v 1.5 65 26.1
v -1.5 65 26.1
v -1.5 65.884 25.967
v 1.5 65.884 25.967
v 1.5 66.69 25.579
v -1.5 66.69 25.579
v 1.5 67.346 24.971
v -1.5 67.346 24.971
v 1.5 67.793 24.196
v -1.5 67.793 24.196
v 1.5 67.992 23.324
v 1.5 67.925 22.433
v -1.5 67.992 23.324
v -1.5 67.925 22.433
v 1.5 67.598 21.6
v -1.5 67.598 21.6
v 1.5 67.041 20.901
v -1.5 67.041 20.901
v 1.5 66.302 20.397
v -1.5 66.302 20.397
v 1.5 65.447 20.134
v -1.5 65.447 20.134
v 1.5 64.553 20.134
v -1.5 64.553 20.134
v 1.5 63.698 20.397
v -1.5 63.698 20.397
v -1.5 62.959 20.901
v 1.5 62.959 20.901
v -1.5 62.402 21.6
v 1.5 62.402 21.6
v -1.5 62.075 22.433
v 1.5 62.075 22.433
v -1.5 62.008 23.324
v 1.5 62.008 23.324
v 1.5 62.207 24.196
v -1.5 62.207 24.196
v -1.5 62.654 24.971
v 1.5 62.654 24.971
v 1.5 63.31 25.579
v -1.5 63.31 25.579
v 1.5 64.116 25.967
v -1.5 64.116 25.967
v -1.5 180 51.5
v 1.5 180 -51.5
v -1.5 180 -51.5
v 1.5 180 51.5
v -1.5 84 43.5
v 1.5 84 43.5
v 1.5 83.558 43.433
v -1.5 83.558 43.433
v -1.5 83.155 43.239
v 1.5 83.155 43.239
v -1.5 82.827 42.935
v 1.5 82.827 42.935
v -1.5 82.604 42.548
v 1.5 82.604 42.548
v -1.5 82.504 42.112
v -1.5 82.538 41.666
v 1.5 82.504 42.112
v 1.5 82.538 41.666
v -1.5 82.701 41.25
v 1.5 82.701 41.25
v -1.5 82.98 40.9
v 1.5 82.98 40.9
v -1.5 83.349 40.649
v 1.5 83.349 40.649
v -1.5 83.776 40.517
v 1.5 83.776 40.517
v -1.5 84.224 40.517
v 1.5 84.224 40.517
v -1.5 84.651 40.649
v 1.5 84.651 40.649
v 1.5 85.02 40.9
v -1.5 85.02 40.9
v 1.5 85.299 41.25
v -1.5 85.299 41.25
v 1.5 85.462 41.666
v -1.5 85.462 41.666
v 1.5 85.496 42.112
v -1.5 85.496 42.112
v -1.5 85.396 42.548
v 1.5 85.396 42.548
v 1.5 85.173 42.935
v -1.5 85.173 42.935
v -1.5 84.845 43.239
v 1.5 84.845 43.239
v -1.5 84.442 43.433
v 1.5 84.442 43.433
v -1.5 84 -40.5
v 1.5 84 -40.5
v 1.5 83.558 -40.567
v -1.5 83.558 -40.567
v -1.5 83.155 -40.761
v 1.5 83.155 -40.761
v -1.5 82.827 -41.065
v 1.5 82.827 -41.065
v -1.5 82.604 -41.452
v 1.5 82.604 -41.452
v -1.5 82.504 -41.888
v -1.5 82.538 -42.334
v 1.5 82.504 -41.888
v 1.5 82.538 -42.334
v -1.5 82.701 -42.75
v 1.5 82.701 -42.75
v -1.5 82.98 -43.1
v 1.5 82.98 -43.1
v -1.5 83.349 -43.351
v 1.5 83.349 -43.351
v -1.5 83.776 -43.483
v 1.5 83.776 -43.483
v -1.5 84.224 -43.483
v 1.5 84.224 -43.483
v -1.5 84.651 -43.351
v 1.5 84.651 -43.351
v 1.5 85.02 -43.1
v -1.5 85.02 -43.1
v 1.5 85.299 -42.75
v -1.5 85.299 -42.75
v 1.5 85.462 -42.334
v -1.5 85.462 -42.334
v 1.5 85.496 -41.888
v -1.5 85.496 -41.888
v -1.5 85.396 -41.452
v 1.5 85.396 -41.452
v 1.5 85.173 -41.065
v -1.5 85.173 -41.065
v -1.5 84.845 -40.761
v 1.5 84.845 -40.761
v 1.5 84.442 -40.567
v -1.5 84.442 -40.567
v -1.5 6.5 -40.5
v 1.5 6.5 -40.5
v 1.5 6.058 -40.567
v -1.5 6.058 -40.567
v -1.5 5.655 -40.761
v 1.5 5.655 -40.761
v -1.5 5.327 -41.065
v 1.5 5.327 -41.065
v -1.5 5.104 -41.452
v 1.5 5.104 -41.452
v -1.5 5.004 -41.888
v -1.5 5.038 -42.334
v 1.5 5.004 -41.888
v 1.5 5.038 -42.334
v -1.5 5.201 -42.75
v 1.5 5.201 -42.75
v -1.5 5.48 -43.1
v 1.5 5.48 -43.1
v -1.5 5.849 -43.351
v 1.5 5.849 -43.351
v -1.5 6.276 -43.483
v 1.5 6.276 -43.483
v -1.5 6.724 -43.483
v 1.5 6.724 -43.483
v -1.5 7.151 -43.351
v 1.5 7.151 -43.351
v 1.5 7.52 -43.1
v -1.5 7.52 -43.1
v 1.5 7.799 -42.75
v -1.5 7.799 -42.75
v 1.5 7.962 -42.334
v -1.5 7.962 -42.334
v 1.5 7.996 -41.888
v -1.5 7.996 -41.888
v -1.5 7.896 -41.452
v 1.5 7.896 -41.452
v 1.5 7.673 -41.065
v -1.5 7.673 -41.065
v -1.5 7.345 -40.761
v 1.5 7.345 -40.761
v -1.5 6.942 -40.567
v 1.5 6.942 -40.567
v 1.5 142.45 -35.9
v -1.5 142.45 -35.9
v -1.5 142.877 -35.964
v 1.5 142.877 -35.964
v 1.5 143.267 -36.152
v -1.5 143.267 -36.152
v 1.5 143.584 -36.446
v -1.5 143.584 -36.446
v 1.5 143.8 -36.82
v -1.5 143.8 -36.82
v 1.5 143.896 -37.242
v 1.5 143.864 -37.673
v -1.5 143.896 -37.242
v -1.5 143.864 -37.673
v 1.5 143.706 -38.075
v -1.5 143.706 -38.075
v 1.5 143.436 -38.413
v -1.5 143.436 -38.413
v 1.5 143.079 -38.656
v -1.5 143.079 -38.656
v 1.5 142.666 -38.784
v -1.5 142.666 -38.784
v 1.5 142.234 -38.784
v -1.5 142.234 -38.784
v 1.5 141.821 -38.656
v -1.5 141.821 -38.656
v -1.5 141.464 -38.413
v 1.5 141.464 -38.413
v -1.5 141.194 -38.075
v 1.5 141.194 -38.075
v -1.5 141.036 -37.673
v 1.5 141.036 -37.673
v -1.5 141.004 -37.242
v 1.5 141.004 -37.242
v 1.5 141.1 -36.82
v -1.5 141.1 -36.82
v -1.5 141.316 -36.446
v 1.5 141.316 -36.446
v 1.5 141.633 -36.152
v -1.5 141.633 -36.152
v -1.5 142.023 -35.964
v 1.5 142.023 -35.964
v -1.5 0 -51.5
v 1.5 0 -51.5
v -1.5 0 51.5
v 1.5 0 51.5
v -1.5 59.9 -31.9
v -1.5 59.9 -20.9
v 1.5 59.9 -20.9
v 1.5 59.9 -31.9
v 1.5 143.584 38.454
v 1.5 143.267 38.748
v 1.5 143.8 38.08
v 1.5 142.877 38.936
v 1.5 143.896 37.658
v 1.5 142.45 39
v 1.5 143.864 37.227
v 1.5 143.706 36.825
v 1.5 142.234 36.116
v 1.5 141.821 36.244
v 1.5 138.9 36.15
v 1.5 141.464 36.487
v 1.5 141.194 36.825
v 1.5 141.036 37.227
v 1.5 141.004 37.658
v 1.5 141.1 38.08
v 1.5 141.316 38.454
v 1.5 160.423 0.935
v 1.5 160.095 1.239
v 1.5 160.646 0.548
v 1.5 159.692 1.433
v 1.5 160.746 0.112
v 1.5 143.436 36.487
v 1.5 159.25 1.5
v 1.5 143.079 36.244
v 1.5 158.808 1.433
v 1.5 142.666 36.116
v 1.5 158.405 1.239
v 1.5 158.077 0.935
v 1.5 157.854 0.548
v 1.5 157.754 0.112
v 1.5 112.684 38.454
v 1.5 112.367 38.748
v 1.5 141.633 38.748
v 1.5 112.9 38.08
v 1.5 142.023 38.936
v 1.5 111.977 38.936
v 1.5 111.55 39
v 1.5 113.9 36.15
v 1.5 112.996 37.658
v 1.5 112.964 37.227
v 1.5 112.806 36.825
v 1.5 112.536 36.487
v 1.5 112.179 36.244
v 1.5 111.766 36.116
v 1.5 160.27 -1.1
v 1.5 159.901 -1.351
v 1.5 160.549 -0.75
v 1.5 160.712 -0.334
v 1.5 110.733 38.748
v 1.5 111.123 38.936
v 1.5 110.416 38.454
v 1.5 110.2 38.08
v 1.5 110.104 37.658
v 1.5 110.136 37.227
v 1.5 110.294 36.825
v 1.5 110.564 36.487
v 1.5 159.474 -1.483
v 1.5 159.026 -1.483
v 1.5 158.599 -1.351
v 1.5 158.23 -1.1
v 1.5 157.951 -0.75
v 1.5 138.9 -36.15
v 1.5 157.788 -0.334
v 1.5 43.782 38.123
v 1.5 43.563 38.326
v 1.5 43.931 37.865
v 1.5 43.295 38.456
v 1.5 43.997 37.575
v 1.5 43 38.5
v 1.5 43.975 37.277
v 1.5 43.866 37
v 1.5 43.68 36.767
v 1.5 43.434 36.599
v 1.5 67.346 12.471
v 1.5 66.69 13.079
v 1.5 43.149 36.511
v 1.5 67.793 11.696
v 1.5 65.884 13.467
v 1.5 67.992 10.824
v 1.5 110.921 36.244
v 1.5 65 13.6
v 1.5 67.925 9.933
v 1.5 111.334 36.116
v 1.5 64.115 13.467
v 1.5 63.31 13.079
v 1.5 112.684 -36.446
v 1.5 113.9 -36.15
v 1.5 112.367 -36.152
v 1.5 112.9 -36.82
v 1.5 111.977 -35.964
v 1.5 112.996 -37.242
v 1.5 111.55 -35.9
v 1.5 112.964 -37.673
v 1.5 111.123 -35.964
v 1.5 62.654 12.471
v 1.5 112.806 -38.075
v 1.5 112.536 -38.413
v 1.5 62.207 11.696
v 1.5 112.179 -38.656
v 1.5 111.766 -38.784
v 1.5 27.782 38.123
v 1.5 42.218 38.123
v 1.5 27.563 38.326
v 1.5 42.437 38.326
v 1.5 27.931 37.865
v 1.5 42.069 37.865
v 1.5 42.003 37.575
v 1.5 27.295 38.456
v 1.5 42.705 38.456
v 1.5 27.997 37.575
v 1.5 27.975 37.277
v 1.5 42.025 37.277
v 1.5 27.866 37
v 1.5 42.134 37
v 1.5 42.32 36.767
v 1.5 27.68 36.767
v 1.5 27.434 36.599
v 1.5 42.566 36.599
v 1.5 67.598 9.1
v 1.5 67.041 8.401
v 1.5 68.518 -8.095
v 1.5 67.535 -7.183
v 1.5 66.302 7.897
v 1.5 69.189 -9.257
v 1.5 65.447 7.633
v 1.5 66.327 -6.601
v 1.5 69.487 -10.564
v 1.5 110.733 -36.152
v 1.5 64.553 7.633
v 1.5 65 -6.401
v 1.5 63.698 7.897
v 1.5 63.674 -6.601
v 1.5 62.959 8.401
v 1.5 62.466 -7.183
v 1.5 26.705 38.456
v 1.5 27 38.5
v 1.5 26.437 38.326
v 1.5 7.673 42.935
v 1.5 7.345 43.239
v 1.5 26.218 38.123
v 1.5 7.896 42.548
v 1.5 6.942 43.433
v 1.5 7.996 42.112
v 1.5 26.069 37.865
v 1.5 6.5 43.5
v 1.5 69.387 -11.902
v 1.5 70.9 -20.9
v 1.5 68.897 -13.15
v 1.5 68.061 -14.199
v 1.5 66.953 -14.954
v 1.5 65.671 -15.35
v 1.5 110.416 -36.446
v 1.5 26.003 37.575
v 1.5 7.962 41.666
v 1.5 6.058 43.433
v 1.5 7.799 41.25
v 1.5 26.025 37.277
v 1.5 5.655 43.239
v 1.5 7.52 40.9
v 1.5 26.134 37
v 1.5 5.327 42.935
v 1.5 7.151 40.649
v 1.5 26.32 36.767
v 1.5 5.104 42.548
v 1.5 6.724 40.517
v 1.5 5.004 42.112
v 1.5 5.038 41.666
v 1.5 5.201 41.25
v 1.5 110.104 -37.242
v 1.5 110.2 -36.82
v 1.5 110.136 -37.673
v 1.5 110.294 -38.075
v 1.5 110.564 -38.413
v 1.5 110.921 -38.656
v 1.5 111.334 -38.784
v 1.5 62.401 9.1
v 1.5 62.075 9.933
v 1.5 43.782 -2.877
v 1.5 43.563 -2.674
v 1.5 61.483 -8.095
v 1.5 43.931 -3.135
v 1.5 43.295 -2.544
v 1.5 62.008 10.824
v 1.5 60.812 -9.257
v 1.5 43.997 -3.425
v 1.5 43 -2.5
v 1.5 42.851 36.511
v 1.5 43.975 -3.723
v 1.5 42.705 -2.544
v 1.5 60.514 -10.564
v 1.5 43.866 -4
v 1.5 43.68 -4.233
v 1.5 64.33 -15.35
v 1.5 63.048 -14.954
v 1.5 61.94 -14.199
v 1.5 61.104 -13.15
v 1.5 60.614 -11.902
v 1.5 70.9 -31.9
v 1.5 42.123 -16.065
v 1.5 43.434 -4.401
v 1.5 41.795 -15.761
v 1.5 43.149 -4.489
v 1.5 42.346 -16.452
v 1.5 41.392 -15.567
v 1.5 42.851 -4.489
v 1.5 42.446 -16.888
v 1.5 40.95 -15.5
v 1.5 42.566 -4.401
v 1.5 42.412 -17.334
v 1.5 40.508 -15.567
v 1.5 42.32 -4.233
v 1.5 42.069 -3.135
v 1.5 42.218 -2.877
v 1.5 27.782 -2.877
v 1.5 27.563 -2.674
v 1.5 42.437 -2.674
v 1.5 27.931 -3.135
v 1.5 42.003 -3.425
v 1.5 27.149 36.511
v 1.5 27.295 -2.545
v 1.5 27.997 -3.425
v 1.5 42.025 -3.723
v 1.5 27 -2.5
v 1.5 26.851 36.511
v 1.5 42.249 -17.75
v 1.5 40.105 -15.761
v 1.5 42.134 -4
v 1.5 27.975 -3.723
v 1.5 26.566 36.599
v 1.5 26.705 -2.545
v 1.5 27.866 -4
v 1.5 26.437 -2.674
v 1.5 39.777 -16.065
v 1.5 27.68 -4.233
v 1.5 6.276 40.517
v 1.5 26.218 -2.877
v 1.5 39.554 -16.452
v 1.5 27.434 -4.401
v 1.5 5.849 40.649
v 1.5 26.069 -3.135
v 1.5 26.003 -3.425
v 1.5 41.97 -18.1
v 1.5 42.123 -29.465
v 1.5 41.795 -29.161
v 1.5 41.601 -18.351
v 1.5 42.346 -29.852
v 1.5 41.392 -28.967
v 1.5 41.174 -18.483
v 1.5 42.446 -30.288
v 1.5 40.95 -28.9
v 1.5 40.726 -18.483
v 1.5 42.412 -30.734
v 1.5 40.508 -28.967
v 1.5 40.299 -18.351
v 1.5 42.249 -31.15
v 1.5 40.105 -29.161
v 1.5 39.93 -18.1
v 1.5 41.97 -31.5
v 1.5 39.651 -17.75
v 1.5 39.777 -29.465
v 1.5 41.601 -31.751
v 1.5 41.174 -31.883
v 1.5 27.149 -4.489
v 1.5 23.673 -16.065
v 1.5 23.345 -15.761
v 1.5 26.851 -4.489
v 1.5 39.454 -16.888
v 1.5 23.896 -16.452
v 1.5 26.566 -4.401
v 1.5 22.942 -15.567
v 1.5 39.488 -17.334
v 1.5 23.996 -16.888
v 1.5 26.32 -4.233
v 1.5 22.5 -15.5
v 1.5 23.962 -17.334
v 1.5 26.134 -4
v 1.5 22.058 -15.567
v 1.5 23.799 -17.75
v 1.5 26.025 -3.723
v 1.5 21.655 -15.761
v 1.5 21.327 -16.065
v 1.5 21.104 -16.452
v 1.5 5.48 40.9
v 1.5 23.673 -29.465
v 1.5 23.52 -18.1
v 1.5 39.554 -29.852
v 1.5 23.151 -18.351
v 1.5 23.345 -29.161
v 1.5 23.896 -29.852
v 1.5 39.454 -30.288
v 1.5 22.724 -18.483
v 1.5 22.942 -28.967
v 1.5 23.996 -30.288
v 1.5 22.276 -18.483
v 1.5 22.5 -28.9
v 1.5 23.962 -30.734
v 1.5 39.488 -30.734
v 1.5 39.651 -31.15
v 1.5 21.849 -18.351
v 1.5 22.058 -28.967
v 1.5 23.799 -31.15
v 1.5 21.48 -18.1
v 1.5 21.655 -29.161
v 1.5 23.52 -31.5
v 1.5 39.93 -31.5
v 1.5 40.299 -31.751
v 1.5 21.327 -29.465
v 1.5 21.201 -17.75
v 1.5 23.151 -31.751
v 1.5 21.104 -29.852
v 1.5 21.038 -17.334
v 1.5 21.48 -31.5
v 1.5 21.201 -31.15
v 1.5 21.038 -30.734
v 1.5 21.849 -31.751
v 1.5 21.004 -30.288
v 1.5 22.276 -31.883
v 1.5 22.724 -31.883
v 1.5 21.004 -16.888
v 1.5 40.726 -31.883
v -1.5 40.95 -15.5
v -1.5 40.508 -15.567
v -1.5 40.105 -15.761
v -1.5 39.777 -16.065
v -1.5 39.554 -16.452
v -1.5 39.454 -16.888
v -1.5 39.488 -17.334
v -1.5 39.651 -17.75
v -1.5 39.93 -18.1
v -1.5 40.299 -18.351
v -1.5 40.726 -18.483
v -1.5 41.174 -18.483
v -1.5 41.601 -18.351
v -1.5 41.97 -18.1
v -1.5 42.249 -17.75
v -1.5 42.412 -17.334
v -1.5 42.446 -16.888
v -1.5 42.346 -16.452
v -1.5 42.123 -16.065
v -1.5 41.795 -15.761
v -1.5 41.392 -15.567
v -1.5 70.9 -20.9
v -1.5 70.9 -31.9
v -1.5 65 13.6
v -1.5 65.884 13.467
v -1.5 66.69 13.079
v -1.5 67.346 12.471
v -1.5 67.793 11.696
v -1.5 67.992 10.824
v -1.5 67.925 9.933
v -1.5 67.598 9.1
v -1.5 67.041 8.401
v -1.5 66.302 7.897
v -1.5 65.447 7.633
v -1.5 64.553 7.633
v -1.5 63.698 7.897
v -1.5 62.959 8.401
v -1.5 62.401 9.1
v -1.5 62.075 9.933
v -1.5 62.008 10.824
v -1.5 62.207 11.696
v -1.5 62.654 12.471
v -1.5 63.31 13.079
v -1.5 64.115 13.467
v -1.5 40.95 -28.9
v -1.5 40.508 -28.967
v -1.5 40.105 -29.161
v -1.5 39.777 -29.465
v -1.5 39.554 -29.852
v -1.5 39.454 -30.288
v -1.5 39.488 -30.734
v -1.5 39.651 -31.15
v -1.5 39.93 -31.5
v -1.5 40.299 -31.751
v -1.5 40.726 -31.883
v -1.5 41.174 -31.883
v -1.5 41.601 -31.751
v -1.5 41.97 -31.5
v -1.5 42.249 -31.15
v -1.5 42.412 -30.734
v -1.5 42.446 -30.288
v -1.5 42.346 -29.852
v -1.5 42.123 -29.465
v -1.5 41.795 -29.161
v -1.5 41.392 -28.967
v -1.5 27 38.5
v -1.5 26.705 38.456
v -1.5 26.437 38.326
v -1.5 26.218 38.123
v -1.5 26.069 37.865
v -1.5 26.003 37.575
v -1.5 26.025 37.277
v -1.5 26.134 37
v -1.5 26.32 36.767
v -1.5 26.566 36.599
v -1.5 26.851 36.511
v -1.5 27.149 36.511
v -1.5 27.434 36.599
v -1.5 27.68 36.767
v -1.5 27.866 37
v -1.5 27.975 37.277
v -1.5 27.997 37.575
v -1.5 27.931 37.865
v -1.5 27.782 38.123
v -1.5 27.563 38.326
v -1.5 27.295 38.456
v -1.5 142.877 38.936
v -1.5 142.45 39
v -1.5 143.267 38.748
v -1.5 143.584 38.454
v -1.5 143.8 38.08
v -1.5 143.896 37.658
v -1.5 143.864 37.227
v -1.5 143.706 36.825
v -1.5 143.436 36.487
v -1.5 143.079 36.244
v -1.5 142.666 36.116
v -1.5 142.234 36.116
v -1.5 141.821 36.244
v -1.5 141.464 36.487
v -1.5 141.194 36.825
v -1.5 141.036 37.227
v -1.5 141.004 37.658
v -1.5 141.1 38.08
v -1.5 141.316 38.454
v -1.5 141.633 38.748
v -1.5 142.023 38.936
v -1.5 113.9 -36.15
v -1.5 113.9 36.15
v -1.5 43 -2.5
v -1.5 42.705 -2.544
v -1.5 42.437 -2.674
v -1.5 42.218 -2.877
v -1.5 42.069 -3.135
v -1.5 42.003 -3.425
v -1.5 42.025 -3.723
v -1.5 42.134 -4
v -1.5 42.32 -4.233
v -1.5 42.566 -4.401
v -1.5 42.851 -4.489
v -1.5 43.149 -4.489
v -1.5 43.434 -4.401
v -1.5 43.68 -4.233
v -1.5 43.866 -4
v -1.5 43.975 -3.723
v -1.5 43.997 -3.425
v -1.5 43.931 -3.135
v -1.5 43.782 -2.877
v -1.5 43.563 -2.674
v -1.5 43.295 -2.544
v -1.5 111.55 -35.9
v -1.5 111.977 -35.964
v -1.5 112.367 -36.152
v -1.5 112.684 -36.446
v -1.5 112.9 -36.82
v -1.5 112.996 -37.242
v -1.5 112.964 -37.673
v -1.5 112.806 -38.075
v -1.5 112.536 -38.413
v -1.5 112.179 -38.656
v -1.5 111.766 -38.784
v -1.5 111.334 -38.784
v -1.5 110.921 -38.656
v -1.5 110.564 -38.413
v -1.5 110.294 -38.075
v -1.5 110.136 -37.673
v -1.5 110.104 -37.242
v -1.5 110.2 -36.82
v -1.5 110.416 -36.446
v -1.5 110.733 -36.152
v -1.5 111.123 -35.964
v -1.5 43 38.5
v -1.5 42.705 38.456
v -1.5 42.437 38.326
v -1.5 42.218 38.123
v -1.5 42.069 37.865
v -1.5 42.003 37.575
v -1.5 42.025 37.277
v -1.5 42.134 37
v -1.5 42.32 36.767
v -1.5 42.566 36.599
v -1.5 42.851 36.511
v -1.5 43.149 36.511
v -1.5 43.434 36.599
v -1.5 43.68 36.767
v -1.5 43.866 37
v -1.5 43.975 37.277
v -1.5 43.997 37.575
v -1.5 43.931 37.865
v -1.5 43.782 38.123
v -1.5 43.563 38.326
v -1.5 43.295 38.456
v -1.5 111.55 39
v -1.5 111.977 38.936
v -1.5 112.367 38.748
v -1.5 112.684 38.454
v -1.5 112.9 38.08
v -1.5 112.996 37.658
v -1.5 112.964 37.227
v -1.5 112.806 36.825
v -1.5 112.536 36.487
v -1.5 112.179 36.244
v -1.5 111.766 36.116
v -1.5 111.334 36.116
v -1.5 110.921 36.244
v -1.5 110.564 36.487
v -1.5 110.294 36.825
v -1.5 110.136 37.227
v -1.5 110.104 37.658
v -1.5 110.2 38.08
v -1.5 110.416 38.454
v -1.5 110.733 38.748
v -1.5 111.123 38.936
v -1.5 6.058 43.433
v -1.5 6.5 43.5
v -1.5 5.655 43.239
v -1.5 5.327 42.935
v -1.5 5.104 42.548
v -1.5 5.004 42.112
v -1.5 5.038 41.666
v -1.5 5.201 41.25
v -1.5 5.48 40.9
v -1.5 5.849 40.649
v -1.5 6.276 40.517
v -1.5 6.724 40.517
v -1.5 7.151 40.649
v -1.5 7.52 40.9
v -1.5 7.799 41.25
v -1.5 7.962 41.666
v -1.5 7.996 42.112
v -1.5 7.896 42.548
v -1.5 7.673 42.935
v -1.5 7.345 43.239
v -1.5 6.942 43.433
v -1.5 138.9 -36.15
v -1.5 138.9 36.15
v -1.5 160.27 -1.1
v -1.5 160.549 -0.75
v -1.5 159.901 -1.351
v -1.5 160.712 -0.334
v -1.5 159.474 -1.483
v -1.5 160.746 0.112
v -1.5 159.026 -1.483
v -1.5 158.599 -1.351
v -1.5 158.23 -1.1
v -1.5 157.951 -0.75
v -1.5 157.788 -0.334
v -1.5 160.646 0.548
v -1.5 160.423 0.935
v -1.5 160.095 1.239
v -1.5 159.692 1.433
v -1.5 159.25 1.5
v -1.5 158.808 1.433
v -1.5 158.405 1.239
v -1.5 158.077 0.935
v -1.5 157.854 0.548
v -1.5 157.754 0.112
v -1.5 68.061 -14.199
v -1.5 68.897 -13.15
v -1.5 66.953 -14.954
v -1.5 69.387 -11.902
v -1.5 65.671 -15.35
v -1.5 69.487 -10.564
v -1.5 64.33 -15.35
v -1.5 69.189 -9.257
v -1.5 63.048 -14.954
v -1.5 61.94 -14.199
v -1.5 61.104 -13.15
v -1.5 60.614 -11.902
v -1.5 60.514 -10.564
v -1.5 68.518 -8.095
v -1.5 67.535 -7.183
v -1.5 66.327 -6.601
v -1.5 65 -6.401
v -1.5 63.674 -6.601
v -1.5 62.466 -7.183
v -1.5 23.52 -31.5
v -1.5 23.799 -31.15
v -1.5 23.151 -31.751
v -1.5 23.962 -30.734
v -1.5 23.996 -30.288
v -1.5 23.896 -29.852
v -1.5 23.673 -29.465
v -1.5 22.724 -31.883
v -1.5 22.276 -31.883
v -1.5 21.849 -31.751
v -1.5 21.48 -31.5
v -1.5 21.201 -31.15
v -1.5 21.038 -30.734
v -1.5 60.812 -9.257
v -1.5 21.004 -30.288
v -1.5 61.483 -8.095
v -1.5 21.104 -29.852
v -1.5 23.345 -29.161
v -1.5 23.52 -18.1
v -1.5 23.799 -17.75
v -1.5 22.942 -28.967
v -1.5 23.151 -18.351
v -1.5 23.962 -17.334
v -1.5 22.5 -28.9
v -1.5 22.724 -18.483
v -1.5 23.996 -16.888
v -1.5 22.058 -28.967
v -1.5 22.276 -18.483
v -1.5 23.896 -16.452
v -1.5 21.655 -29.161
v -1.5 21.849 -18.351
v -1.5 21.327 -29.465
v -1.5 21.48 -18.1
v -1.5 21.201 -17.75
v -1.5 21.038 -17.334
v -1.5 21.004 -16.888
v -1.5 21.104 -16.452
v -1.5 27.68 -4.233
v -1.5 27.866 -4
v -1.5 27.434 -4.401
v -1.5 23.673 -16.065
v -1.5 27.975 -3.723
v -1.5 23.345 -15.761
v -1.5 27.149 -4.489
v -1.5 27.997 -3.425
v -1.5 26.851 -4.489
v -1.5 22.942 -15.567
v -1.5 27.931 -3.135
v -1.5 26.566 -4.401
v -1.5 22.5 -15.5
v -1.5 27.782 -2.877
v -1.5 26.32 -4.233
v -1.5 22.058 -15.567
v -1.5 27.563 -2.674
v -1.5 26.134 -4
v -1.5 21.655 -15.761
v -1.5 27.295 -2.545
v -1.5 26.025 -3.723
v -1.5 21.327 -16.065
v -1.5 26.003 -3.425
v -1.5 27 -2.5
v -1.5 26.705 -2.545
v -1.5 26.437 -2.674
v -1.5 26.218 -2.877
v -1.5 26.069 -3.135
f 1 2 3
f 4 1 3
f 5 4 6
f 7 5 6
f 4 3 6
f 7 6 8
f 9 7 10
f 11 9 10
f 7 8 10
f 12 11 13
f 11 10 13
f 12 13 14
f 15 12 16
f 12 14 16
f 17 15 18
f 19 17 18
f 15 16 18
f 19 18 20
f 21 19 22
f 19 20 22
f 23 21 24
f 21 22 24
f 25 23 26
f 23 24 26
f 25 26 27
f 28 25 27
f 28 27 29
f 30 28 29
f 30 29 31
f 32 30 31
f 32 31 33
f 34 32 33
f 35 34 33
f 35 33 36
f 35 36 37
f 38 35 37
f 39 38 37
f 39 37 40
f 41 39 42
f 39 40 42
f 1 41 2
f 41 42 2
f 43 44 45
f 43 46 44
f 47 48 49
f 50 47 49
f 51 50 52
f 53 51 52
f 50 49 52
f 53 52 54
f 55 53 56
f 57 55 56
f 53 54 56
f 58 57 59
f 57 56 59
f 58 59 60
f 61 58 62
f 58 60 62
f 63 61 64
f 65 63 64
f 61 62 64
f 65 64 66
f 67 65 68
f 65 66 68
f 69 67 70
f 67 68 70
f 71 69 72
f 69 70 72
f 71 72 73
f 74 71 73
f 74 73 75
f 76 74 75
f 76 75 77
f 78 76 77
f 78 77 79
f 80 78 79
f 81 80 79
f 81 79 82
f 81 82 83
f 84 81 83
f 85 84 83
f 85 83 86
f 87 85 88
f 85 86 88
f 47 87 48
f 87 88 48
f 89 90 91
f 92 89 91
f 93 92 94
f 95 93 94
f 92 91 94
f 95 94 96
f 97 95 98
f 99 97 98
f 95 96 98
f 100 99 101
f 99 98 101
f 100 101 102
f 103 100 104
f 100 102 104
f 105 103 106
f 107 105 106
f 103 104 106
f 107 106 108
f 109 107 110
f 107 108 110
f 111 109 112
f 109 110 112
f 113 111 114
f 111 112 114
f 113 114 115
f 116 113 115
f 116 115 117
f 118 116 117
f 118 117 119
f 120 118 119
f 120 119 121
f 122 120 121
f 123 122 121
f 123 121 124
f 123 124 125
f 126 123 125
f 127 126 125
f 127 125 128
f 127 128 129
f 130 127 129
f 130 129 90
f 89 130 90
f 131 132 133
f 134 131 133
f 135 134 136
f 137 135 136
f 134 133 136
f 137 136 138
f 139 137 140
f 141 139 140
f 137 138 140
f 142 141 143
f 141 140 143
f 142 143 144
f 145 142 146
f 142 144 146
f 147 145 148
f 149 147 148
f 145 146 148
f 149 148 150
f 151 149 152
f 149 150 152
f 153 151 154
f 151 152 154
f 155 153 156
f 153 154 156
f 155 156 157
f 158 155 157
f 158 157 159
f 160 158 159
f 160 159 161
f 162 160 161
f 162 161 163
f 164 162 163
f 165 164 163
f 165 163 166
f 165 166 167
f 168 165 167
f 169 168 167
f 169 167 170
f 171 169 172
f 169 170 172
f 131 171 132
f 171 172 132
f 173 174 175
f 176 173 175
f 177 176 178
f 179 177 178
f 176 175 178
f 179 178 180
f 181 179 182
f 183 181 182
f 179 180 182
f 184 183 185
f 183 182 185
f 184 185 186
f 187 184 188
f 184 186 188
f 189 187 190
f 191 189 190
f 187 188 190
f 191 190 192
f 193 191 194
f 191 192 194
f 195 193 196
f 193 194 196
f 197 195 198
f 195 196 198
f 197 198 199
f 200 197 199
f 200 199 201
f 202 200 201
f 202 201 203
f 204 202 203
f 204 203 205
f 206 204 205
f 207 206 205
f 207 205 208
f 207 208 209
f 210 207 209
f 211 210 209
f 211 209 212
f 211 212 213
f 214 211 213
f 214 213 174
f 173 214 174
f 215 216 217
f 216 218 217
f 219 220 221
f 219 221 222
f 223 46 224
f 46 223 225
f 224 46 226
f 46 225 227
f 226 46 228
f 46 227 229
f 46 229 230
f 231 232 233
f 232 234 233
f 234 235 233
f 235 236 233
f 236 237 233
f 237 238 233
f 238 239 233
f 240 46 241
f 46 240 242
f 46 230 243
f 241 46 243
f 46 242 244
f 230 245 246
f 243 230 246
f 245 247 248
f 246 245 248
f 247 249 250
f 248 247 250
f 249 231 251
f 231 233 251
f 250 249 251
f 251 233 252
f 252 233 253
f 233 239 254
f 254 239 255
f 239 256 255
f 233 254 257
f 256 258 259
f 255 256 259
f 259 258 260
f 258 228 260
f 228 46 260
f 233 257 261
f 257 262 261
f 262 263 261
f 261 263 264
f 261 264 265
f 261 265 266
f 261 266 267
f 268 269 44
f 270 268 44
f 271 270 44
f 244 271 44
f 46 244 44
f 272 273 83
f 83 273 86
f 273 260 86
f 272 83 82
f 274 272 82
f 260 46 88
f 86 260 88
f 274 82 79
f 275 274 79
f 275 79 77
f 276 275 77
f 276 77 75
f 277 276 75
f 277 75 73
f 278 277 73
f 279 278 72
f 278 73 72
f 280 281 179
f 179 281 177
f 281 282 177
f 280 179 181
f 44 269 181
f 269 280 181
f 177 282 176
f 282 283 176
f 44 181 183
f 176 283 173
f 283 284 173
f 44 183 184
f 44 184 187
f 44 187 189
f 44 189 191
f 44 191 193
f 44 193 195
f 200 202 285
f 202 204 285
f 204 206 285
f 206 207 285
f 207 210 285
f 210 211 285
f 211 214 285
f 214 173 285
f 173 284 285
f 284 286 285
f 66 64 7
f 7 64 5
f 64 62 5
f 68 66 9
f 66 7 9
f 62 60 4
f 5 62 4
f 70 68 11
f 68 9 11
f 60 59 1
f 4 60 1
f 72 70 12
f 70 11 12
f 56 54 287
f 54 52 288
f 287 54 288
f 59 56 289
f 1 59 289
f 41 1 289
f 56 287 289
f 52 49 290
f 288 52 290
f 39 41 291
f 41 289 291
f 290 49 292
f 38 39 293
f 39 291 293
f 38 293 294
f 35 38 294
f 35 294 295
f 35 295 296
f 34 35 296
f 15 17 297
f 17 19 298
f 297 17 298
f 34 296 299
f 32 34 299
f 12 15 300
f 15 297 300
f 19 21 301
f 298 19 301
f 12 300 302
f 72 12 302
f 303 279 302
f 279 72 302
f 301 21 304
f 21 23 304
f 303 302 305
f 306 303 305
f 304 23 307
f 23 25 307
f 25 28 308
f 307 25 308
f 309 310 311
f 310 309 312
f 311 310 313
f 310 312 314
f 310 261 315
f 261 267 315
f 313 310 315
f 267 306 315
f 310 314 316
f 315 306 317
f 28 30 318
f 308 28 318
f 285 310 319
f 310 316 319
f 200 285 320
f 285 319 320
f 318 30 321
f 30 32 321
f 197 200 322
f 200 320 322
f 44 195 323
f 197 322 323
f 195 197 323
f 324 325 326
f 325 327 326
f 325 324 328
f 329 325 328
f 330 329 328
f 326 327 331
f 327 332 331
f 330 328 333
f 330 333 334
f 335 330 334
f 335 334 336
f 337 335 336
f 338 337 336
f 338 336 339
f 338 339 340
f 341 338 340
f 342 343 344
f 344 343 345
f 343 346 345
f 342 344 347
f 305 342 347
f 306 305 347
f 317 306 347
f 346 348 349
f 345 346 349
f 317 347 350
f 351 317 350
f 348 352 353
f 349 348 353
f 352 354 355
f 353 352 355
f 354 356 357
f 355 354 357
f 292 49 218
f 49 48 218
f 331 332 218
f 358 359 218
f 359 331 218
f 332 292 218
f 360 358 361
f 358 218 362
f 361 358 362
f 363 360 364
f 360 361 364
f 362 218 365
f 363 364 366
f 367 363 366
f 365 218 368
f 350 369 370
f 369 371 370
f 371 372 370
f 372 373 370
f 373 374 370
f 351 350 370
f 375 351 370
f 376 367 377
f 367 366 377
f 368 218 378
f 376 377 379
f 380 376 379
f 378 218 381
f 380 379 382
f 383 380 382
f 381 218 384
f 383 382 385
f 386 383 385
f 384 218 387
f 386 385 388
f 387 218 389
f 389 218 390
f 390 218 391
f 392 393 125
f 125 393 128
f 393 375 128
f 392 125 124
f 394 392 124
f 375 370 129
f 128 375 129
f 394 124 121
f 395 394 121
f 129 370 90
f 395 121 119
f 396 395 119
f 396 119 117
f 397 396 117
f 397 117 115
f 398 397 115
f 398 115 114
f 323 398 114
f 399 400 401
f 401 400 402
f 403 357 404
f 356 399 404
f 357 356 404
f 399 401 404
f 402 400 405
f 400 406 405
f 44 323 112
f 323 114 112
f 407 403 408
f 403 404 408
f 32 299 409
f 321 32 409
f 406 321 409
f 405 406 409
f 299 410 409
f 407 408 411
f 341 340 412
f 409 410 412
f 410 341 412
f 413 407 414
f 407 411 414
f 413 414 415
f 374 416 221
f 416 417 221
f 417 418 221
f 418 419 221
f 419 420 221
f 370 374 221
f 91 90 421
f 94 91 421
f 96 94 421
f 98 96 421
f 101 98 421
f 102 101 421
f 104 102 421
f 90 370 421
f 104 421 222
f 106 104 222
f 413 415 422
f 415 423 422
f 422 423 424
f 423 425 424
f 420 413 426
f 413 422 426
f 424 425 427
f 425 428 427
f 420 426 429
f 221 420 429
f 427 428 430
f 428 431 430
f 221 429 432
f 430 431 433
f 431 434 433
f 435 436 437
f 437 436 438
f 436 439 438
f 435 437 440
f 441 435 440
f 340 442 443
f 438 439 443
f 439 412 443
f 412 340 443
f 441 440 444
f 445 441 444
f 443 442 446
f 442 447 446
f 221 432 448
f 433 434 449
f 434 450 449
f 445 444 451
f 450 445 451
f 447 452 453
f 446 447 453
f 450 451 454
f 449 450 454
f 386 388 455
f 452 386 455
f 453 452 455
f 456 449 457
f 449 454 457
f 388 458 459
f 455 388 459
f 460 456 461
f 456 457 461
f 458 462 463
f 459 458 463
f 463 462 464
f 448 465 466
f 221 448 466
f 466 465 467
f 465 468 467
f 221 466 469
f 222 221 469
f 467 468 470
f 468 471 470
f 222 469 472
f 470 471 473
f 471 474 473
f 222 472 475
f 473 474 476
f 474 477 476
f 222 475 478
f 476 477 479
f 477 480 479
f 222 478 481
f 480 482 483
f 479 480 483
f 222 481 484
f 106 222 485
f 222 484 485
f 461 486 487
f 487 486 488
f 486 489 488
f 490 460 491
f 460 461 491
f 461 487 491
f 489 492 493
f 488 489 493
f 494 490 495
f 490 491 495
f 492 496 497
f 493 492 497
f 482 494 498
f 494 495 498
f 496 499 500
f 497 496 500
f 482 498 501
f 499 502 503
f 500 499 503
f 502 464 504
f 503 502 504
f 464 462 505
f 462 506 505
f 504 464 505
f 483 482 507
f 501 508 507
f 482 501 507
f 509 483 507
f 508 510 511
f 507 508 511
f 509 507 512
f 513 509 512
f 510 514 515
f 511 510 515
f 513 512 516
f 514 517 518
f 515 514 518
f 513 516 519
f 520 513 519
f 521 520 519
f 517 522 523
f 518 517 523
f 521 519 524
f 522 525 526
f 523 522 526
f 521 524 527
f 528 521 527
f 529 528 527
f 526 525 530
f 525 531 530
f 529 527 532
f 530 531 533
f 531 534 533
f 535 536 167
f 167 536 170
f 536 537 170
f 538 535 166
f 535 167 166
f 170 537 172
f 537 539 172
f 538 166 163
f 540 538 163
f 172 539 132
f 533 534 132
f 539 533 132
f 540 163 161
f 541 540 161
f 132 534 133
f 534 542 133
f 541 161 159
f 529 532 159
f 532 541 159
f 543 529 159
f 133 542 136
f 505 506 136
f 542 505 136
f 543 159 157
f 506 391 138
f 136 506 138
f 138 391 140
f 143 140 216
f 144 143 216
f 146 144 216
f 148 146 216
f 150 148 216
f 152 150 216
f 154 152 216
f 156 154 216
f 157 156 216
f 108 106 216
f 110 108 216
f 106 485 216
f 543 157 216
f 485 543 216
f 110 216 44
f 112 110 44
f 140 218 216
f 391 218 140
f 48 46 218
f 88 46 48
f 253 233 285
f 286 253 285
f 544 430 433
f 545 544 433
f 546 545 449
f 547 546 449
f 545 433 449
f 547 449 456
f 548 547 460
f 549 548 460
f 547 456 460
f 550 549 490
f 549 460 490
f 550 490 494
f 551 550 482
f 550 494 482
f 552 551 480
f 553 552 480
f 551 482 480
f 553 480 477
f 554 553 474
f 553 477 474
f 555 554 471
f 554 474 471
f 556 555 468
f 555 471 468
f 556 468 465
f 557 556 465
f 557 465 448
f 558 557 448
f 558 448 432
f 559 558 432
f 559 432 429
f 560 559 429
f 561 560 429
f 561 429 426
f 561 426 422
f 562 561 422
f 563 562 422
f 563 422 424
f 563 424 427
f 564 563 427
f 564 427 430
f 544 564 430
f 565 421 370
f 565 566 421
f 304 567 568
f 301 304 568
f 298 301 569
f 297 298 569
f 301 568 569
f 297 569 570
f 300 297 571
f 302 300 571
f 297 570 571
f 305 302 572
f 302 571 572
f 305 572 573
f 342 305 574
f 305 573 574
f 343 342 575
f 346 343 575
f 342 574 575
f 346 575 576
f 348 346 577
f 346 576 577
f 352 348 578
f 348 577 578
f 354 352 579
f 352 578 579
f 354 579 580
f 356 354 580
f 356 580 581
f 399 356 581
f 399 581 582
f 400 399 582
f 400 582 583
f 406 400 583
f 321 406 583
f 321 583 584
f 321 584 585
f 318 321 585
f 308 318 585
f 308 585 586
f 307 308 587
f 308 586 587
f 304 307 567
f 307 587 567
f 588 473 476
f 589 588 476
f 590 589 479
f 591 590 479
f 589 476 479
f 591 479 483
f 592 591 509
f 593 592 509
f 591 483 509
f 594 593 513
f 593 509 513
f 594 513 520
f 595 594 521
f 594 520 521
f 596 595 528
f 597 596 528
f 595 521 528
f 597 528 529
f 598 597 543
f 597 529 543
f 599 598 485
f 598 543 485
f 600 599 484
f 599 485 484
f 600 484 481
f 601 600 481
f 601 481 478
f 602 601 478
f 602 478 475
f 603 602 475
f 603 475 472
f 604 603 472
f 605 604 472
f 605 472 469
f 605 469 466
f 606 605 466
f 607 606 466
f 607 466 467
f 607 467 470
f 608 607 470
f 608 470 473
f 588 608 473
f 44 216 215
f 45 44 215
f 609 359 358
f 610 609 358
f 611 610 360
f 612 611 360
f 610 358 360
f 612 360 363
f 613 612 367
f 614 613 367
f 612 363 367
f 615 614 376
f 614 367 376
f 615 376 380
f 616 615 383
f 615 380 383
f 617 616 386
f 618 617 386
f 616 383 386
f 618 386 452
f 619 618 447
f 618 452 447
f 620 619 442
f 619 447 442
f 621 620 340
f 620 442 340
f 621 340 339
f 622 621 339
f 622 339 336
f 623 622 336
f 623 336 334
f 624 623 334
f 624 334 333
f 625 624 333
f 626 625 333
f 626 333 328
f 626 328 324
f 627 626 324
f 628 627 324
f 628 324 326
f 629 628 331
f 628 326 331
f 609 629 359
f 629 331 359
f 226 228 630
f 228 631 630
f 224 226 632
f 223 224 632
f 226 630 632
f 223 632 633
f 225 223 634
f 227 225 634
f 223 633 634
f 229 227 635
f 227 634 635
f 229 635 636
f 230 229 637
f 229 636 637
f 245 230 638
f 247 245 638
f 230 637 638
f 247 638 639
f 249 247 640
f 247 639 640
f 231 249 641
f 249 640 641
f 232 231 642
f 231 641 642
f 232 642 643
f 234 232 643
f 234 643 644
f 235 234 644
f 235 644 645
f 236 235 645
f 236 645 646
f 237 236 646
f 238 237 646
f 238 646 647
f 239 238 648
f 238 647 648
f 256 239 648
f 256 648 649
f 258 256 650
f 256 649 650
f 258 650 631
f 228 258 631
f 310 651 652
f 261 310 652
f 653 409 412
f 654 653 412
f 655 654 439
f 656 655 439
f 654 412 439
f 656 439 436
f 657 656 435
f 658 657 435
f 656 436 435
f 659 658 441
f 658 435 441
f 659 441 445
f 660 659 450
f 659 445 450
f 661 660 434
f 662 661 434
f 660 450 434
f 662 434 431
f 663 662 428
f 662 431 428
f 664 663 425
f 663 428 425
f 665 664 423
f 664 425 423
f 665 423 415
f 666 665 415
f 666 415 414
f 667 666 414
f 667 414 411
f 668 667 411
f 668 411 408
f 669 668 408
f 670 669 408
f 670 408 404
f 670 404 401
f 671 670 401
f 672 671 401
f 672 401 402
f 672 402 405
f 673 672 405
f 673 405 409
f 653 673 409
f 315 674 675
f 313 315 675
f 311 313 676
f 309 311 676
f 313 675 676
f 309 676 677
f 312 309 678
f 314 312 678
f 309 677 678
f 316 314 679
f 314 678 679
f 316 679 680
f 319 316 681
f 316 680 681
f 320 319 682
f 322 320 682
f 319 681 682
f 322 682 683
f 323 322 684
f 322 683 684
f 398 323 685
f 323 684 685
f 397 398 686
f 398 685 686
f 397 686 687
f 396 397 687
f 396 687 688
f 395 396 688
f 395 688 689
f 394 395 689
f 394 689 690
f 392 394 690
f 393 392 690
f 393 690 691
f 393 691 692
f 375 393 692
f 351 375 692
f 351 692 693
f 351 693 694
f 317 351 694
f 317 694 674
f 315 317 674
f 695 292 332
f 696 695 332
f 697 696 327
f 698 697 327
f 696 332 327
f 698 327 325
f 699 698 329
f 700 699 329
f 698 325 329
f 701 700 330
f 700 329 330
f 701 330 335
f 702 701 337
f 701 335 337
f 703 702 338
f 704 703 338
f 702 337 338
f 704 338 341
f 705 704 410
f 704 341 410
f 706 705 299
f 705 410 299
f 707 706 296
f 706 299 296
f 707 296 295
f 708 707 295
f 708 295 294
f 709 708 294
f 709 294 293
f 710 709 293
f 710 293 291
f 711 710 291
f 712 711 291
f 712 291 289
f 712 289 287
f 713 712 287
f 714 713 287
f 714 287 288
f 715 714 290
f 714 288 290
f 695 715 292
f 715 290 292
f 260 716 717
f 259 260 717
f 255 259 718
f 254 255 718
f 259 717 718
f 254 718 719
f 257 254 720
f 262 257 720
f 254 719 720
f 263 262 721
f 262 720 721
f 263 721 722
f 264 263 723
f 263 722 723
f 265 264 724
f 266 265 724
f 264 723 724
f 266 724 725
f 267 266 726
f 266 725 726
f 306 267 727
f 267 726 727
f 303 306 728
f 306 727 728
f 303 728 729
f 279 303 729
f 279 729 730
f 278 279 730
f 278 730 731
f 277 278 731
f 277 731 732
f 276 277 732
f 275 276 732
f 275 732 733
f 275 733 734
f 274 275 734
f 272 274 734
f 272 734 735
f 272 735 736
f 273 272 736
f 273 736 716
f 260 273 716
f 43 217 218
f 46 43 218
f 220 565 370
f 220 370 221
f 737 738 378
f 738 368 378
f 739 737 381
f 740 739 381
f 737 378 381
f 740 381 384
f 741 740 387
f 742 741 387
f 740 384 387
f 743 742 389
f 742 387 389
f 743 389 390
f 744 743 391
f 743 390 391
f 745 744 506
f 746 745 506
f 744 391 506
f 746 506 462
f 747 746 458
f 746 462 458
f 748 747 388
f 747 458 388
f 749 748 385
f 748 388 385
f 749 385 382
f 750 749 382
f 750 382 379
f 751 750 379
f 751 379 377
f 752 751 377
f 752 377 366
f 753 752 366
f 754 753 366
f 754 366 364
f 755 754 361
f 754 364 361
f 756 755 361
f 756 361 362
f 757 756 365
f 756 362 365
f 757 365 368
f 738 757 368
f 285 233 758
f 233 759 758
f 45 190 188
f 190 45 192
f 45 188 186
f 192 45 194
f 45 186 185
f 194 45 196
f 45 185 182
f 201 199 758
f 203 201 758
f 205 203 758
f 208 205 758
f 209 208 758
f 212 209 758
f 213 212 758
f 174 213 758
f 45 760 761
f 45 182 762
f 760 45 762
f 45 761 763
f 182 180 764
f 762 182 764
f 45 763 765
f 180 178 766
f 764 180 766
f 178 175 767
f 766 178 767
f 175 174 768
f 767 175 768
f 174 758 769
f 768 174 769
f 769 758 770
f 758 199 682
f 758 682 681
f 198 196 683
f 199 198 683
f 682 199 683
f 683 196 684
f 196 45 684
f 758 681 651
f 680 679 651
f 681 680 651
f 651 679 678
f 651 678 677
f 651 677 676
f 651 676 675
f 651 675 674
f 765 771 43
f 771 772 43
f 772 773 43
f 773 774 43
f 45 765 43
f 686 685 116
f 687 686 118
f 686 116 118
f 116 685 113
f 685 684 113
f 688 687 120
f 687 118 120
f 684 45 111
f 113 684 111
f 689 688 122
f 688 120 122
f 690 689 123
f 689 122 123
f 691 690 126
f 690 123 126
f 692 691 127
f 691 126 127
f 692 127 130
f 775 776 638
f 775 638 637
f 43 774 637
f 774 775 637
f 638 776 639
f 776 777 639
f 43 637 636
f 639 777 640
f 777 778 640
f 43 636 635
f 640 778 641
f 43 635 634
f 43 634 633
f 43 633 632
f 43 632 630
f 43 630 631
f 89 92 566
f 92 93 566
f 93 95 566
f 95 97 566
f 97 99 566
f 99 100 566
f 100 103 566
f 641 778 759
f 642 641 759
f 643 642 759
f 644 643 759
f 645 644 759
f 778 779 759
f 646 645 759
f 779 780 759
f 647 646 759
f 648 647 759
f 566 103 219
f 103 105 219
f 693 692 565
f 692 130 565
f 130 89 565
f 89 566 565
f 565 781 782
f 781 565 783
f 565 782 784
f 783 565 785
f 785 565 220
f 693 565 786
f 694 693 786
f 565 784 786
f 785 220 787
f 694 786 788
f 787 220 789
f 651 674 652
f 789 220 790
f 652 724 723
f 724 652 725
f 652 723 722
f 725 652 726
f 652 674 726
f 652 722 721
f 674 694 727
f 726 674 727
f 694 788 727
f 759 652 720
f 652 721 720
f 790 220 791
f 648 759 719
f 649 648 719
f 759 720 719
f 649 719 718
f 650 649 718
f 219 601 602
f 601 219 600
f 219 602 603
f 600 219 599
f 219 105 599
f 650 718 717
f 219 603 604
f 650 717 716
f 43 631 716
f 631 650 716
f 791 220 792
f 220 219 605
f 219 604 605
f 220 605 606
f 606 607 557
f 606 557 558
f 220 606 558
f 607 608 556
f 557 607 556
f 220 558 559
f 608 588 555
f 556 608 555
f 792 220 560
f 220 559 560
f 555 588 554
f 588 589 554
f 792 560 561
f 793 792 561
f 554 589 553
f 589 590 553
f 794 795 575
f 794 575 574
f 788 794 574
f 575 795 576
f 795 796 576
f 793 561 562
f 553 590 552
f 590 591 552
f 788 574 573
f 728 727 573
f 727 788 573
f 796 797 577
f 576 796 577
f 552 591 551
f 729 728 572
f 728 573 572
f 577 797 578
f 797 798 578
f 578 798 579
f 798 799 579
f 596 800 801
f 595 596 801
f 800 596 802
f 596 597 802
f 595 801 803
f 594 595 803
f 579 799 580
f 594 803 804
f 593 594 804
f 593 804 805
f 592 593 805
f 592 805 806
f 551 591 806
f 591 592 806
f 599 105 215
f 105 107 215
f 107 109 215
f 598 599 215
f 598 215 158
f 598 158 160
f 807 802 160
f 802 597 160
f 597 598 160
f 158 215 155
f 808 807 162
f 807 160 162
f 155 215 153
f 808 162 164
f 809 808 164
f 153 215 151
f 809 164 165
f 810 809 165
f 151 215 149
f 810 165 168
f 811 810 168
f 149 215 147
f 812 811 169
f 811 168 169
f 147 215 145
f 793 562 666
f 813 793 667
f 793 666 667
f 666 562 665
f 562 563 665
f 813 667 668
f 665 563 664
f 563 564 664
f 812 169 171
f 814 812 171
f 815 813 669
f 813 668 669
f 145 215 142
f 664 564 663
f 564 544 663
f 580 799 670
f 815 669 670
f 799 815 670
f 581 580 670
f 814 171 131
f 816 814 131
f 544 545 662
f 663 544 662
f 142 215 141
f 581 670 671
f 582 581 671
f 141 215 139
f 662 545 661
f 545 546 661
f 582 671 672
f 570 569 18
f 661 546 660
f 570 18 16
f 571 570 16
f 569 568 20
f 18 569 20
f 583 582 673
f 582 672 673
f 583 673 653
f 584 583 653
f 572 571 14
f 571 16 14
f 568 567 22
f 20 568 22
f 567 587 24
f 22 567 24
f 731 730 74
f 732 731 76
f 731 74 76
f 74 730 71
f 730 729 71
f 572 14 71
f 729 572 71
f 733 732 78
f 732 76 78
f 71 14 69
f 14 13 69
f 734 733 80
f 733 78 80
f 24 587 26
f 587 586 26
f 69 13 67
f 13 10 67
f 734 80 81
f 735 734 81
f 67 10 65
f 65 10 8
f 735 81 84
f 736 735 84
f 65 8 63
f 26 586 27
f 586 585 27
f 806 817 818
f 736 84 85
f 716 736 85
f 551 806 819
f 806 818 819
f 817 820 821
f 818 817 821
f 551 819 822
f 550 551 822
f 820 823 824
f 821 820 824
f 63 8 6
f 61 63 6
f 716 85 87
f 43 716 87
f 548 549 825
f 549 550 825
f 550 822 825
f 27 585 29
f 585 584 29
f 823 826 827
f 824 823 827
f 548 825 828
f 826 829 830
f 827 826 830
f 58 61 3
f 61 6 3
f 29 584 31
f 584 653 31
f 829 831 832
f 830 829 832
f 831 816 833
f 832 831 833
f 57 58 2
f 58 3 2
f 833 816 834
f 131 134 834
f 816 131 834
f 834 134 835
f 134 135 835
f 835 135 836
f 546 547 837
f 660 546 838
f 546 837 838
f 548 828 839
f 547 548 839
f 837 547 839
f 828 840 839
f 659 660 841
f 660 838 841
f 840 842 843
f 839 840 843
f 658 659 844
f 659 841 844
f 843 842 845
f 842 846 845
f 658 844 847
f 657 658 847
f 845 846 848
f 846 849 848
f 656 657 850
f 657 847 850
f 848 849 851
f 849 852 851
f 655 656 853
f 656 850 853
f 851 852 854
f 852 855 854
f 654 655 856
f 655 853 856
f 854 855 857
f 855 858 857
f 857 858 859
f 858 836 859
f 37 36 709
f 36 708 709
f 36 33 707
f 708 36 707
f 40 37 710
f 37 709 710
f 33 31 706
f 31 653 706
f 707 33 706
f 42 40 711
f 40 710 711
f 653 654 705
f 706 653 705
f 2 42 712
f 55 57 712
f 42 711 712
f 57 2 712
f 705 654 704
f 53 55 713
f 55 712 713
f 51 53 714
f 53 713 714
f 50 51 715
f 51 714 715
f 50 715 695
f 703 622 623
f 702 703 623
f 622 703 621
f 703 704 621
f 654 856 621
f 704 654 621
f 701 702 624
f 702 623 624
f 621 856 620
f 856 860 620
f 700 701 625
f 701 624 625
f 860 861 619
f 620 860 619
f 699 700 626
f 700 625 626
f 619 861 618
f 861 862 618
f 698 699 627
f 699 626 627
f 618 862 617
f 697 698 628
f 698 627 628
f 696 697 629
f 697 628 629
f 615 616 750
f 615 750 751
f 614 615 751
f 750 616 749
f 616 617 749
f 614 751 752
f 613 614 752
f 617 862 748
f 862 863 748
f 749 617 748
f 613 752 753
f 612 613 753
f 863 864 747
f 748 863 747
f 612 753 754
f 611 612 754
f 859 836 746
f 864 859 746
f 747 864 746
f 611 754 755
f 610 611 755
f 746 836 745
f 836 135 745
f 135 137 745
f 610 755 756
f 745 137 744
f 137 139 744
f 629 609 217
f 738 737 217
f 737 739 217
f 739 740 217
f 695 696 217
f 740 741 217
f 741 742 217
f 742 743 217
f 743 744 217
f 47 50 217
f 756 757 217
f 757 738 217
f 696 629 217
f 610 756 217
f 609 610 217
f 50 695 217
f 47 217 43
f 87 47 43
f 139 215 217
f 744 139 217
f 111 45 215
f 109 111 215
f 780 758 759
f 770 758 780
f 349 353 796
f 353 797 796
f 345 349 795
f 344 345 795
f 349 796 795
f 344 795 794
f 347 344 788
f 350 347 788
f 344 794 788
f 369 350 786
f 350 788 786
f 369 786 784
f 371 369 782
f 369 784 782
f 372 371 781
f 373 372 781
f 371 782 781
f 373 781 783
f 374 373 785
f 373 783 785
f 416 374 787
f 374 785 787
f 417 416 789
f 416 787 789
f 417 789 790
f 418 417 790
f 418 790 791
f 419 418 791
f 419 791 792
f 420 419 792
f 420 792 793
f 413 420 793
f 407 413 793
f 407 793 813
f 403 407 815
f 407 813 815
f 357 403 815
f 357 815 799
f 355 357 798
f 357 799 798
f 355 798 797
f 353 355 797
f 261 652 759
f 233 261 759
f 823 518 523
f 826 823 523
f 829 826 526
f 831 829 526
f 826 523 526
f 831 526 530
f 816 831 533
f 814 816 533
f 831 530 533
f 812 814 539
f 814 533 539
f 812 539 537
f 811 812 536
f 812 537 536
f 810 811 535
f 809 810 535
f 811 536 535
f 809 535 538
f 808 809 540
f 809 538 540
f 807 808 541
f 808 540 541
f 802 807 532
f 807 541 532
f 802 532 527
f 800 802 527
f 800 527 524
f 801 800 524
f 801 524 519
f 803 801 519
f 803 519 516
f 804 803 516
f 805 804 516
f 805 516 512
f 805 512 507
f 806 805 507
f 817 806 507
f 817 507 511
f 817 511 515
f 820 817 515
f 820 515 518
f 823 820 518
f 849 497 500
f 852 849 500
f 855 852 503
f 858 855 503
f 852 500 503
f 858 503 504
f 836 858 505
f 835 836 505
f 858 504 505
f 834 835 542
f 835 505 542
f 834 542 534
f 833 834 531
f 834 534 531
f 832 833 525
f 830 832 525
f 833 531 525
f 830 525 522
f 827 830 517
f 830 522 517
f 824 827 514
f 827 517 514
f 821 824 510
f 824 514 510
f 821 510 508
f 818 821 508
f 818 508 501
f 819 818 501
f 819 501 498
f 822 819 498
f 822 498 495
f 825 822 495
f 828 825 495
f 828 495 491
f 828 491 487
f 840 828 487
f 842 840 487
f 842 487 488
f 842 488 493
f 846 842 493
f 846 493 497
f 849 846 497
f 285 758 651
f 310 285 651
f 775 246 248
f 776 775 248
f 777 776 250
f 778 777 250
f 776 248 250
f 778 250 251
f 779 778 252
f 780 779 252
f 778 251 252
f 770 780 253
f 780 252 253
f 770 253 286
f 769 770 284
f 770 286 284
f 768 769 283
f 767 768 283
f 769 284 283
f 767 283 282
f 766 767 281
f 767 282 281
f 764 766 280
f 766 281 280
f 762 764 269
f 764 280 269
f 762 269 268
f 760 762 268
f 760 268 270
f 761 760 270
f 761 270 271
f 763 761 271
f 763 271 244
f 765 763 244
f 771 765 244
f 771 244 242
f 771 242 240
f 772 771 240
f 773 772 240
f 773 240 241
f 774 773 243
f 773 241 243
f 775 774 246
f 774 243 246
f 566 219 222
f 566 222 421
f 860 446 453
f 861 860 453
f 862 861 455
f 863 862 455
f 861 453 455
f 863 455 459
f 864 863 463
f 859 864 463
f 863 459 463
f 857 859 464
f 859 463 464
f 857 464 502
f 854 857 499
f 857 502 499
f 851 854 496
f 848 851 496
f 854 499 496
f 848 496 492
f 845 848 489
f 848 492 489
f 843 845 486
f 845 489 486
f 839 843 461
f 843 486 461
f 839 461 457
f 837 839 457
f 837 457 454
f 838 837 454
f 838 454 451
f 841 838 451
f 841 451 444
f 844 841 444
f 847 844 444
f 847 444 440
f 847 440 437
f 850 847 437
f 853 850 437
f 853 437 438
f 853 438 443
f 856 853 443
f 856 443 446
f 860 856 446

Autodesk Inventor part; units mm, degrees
ref_plane "YZ Plane" through (0, 0, 0) normal (1, 0, 0) x (0, 1, 0)
ref_plane "XZ Plane" through (0, 0, 0) normal (0, 1, 0) x (-1, 0, 0)
ref_plane "XY Plane" through (0, 0, 0) normal (0, 0, 1) x (1, 0, 0)
sketch "Boceto1" plane through (0, 0, 0) normal (0, 1, 0) x (-1, 0, 0)
  line L0 (-1.5, -51.5) -> (1.5, -51.5)
  line L1 (1.5, -51.5) -> (1.5, 51.5)
  line L2 (1.5, 51.5) -> (-1.5, 51.5)
  line L3 (-1.5, 51.5) -> (-1.5, -51.5)
  line L4 (-1.5, -51.5) -> (1.5, 51.5) construction
  line L5 (1.5, -51.5) -> (-1.5, 51.5) construction
  point P0 (0, 0)
  dimension "d0" = 3
  dimension "d1" = 103
extrude "Extrusión1" add sketch "Boceto1" along normal blind 180
sketch "Boceto2" plane through (-1.5, 0, -51.5) normal (-1, 0, 0) x (0, 0, 1)
  line L0 (3, 148.5) -> (100, 148.5) projected
  line L1 (9.3714, 170) -> (39, 160.0424) projected
  line L2 (9.3714, 170) -> (93.6286, 170) projected
  line L3 (51.5, 148.5) -> (51.5, 170)
  circle A0 centre (51.5, 159.25) radius 1.5
  circle A1 centre (93.5, 84) radius 1.5 projected
  circle A2 centre (9.5, 84) radius 1.5 projected
  circle A3 centre (93.5, 6.5) radius 1.25 projected
  circle A4 centre (9.5, 6.5) radius 1.25 projected
  line L4 (3, 0) -> (16, 0) projected
  line L5 (16, 0) -> (16, 13) projected
  line L6 (3, 13) -> (16, 13) projected
  line L7 (3, 0) -> (3, 13) projected
  circle A5 centre (9.5, 6.5) radius 1.25 projected
  point P0 (51.5, 0)
  dimension "d4" = 3
hole "Agujero1" at (-1.5, 159.25, 0) at (-1.5, 6.5, -42) at (-1.5, 84, -42) at (-1.5, 84, 42) at (-1.5, 6.5, 42) direction (1, 0, 0) diameter 3 depth 5 tip angle 118
sketch "Boceto3" plane through (-1.5, 0, -51.5) normal (-1, 0, 0) x (0, 0, 1)
  circle A0 centre (13.05, 20.58) radius 3.1754 projected
  circle A1 centre (13.05, 47.42) radius 3.1754 projected
  circle A2 centre (42.45, 20.58) radius 3.1754 projected
  circle A3 centre (42.45, 47.42) radius 3.1754 projected
  line L0 (20.6, 69.9) -> (29.6, 69.9) projected
  line L1 (20.6, 69.9) -> (20.6, 60.9) projected
  line L2 (20.6, 60.9) -> (29.6, 60.9) projected
  line L3 (29.6, 60.9) -> (29.6, 69.9) projected
  circle A4 centre (40.5996, 65.0004) radius 3.4994 projected
  circle A5 centre (62.1002, 64.9998) radius 2.0003 projected
  circle A6 centre (74.6001, 65) radius 2.0001 projected
  circle A7 centre (53, 27) radius 0.75 projected
  circle A8 centre (55.5, 43) radius 1 projected
  circle A9 centre (91.5, 27) radius 1 projected
  circle A10 centre (94.0001, 27) radius 0.7499 projected
  circle A11 centre (93.9999, 43.0001) radius 0.7499 projected
  circle A12 centre (89.575, 56.025) radius 1.0751 projected
  circle A13 centre (89.5749, 71.975) radius 1.0749 projected
  circle A14 centre (13.6251, 71.975) radius 1.0751 projected
  circle A15 centre (13.625, 56.0251) radius 1.0749 projected
  circle A16 centre (53, 43) radius 0.75 projected
  line L4 (30.1, 70.4) -> (20.1, 70.4)
  line L5 (20.1, 70.4) -> (20.1, 60.4)
  line L6 (20.1, 60.4) -> (30.1, 60.4)
  line L7 (30.1, 60.4) -> (30.1, 70.4)
  circle A17 centre (40.5996, 65.0004) radius 4.4994
  circle A18 centre (62.1002, 64.9998) radius 3.0003
  circle A19 centre (74.6001, 65) radius 3.0001
  line L8 (19.6, 59.9) -> (19.6, 70.9)
  line L9 (19.6, 70.9) -> (30.6, 70.9)
  line L10 (30.6, 70.9) -> (30.6, 59.9)
  line L11 (30.6, 59.9) -> (19.6, 59.9)
  line L12 (15.85, 138.4) -> (15.85, 114.4) projected
  line L13 (87.15, 138.4) -> (15.85, 138.4) projected
  line L14 (15.85, 114.4) -> (87.15, 114.4) projected
  line L15 (87.15, 114.4) -> (87.15, 138.4) projected
  circle A20 centre (14.15, 142.45) radius 1.45 projected
  circle A21 centre (14.15, 111.55) radius 1.45 projected
  circle A22 centre (89.05, 111.55) radius 1.45 projected
  circle A23 centre (89.05, 142.45) radius 1.45 projected
  line L16 (15.35, 138.9) -> (15.35, 113.9)
  line L17 (15.35, 113.9) -> (87.65, 113.9)
  line L18 (87.65, 113.9) -> (87.65, 138.9)
  line L19 (87.65, 138.9) -> (15.35, 138.9)
  circle A24 centre (42.45, 47.42) radius 1.5
  circle A25 centre (13.05, 47.42) radius 1.5
  circle A26 centre (13.05, 20.58) radius 1.5
  circle A27 centre (42.45, 20.58) radius 1.5
  circle A28 centre (14.15, 111.55) radius 1.5
  point P0 (51.5, 0)
  dimension "d12" = 0.5
  dimension "d13" = 1
  dimension "d14" = 1
  dimension "d15" = 1
  dimension "d16" = 0.5
  dimension "d17" = 0.5
  dimension "d18" = 3
  dimension "d19" = 3
  dimension "d20" = 3
  dimension "d21" = 3
  dimension "d22" = 3
extrude "Extrusión2" cut sketch "Boceto3" against normal through all contours L0 L3 L2 L1 | A4 | A5 | A6 | L7 L6 L5 L4 | A17 | A18 | A19 | L8 L9 L10 L11 | L13 L15 L14 L12 | A20 | A21 | A22 | A23 | L19 L18 L17 L16
hole "Agujero2" at (-1.5, 43, -3.5) at (-1.5, 27.0001, -3.5001) at (-1.5, 27, 37.5) at (-1.5, 43, 37.5) direction (1, 0, 0) diameter 2 end through all
sketch "Boceto5" plane through (-1.5, 0, -51.5) normal (-1, 0, 0) x (0, 0, 1)
  circle A0 centre (21.1, 22.5) radius 1.5 projected
  circle A1 centre (21.1, 40.95) radius 1.5 projected
  circle A2 centre (34.5, 40.95) radius 1.5 projected
  circle A3 centre (34.5, 22.5) radius 1.5 projected
  point P0 (51.5, 0)
hole "Agujero3" at (-1.5, 40.95, -17) at (-1.5, 40.95, -30.4) at (-1.5, 22.5, -30.4) at (-1.5, 22.5, -17) direction (1, 0, 0) diameter 3 end through all
properties part number "Panel1"
